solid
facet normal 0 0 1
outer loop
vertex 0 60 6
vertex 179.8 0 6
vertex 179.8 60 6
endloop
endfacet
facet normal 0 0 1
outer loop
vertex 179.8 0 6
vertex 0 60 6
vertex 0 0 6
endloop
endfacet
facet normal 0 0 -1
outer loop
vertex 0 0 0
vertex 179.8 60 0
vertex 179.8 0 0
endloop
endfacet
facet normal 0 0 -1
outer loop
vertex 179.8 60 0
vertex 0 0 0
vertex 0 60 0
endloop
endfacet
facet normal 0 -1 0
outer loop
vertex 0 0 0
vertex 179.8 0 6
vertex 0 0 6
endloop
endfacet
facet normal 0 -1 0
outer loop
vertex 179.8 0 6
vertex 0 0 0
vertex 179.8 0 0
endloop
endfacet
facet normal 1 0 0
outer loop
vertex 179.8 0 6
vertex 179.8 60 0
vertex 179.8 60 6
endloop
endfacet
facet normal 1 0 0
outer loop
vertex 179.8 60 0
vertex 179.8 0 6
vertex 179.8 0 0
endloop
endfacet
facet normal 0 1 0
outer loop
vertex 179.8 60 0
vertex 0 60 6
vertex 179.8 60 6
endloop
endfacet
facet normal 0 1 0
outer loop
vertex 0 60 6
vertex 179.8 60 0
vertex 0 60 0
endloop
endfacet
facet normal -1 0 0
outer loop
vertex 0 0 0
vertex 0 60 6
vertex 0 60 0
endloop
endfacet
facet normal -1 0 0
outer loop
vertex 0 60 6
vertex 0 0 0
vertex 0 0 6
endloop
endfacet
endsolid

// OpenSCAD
// Audit 2026-11-02 §5 #7: a 0.2 mm modelling error on a 180 mm part hides
// inside the derived tessellation bound at $fn=64 (~0.22 mm). The extents
// here are planes, so the real bbox error is 0 and the author declares a
// tight tolerance -- the 0.2 mm slip must now FAIL.
$fn = 64;

// EXPECTED_BBOX: [180, 60, 6]
// EXPECTED_BBOX_TOL: 0.01

// the bug: 179.8 instead of the declared 180
cube([179.8, 60, 6]);
